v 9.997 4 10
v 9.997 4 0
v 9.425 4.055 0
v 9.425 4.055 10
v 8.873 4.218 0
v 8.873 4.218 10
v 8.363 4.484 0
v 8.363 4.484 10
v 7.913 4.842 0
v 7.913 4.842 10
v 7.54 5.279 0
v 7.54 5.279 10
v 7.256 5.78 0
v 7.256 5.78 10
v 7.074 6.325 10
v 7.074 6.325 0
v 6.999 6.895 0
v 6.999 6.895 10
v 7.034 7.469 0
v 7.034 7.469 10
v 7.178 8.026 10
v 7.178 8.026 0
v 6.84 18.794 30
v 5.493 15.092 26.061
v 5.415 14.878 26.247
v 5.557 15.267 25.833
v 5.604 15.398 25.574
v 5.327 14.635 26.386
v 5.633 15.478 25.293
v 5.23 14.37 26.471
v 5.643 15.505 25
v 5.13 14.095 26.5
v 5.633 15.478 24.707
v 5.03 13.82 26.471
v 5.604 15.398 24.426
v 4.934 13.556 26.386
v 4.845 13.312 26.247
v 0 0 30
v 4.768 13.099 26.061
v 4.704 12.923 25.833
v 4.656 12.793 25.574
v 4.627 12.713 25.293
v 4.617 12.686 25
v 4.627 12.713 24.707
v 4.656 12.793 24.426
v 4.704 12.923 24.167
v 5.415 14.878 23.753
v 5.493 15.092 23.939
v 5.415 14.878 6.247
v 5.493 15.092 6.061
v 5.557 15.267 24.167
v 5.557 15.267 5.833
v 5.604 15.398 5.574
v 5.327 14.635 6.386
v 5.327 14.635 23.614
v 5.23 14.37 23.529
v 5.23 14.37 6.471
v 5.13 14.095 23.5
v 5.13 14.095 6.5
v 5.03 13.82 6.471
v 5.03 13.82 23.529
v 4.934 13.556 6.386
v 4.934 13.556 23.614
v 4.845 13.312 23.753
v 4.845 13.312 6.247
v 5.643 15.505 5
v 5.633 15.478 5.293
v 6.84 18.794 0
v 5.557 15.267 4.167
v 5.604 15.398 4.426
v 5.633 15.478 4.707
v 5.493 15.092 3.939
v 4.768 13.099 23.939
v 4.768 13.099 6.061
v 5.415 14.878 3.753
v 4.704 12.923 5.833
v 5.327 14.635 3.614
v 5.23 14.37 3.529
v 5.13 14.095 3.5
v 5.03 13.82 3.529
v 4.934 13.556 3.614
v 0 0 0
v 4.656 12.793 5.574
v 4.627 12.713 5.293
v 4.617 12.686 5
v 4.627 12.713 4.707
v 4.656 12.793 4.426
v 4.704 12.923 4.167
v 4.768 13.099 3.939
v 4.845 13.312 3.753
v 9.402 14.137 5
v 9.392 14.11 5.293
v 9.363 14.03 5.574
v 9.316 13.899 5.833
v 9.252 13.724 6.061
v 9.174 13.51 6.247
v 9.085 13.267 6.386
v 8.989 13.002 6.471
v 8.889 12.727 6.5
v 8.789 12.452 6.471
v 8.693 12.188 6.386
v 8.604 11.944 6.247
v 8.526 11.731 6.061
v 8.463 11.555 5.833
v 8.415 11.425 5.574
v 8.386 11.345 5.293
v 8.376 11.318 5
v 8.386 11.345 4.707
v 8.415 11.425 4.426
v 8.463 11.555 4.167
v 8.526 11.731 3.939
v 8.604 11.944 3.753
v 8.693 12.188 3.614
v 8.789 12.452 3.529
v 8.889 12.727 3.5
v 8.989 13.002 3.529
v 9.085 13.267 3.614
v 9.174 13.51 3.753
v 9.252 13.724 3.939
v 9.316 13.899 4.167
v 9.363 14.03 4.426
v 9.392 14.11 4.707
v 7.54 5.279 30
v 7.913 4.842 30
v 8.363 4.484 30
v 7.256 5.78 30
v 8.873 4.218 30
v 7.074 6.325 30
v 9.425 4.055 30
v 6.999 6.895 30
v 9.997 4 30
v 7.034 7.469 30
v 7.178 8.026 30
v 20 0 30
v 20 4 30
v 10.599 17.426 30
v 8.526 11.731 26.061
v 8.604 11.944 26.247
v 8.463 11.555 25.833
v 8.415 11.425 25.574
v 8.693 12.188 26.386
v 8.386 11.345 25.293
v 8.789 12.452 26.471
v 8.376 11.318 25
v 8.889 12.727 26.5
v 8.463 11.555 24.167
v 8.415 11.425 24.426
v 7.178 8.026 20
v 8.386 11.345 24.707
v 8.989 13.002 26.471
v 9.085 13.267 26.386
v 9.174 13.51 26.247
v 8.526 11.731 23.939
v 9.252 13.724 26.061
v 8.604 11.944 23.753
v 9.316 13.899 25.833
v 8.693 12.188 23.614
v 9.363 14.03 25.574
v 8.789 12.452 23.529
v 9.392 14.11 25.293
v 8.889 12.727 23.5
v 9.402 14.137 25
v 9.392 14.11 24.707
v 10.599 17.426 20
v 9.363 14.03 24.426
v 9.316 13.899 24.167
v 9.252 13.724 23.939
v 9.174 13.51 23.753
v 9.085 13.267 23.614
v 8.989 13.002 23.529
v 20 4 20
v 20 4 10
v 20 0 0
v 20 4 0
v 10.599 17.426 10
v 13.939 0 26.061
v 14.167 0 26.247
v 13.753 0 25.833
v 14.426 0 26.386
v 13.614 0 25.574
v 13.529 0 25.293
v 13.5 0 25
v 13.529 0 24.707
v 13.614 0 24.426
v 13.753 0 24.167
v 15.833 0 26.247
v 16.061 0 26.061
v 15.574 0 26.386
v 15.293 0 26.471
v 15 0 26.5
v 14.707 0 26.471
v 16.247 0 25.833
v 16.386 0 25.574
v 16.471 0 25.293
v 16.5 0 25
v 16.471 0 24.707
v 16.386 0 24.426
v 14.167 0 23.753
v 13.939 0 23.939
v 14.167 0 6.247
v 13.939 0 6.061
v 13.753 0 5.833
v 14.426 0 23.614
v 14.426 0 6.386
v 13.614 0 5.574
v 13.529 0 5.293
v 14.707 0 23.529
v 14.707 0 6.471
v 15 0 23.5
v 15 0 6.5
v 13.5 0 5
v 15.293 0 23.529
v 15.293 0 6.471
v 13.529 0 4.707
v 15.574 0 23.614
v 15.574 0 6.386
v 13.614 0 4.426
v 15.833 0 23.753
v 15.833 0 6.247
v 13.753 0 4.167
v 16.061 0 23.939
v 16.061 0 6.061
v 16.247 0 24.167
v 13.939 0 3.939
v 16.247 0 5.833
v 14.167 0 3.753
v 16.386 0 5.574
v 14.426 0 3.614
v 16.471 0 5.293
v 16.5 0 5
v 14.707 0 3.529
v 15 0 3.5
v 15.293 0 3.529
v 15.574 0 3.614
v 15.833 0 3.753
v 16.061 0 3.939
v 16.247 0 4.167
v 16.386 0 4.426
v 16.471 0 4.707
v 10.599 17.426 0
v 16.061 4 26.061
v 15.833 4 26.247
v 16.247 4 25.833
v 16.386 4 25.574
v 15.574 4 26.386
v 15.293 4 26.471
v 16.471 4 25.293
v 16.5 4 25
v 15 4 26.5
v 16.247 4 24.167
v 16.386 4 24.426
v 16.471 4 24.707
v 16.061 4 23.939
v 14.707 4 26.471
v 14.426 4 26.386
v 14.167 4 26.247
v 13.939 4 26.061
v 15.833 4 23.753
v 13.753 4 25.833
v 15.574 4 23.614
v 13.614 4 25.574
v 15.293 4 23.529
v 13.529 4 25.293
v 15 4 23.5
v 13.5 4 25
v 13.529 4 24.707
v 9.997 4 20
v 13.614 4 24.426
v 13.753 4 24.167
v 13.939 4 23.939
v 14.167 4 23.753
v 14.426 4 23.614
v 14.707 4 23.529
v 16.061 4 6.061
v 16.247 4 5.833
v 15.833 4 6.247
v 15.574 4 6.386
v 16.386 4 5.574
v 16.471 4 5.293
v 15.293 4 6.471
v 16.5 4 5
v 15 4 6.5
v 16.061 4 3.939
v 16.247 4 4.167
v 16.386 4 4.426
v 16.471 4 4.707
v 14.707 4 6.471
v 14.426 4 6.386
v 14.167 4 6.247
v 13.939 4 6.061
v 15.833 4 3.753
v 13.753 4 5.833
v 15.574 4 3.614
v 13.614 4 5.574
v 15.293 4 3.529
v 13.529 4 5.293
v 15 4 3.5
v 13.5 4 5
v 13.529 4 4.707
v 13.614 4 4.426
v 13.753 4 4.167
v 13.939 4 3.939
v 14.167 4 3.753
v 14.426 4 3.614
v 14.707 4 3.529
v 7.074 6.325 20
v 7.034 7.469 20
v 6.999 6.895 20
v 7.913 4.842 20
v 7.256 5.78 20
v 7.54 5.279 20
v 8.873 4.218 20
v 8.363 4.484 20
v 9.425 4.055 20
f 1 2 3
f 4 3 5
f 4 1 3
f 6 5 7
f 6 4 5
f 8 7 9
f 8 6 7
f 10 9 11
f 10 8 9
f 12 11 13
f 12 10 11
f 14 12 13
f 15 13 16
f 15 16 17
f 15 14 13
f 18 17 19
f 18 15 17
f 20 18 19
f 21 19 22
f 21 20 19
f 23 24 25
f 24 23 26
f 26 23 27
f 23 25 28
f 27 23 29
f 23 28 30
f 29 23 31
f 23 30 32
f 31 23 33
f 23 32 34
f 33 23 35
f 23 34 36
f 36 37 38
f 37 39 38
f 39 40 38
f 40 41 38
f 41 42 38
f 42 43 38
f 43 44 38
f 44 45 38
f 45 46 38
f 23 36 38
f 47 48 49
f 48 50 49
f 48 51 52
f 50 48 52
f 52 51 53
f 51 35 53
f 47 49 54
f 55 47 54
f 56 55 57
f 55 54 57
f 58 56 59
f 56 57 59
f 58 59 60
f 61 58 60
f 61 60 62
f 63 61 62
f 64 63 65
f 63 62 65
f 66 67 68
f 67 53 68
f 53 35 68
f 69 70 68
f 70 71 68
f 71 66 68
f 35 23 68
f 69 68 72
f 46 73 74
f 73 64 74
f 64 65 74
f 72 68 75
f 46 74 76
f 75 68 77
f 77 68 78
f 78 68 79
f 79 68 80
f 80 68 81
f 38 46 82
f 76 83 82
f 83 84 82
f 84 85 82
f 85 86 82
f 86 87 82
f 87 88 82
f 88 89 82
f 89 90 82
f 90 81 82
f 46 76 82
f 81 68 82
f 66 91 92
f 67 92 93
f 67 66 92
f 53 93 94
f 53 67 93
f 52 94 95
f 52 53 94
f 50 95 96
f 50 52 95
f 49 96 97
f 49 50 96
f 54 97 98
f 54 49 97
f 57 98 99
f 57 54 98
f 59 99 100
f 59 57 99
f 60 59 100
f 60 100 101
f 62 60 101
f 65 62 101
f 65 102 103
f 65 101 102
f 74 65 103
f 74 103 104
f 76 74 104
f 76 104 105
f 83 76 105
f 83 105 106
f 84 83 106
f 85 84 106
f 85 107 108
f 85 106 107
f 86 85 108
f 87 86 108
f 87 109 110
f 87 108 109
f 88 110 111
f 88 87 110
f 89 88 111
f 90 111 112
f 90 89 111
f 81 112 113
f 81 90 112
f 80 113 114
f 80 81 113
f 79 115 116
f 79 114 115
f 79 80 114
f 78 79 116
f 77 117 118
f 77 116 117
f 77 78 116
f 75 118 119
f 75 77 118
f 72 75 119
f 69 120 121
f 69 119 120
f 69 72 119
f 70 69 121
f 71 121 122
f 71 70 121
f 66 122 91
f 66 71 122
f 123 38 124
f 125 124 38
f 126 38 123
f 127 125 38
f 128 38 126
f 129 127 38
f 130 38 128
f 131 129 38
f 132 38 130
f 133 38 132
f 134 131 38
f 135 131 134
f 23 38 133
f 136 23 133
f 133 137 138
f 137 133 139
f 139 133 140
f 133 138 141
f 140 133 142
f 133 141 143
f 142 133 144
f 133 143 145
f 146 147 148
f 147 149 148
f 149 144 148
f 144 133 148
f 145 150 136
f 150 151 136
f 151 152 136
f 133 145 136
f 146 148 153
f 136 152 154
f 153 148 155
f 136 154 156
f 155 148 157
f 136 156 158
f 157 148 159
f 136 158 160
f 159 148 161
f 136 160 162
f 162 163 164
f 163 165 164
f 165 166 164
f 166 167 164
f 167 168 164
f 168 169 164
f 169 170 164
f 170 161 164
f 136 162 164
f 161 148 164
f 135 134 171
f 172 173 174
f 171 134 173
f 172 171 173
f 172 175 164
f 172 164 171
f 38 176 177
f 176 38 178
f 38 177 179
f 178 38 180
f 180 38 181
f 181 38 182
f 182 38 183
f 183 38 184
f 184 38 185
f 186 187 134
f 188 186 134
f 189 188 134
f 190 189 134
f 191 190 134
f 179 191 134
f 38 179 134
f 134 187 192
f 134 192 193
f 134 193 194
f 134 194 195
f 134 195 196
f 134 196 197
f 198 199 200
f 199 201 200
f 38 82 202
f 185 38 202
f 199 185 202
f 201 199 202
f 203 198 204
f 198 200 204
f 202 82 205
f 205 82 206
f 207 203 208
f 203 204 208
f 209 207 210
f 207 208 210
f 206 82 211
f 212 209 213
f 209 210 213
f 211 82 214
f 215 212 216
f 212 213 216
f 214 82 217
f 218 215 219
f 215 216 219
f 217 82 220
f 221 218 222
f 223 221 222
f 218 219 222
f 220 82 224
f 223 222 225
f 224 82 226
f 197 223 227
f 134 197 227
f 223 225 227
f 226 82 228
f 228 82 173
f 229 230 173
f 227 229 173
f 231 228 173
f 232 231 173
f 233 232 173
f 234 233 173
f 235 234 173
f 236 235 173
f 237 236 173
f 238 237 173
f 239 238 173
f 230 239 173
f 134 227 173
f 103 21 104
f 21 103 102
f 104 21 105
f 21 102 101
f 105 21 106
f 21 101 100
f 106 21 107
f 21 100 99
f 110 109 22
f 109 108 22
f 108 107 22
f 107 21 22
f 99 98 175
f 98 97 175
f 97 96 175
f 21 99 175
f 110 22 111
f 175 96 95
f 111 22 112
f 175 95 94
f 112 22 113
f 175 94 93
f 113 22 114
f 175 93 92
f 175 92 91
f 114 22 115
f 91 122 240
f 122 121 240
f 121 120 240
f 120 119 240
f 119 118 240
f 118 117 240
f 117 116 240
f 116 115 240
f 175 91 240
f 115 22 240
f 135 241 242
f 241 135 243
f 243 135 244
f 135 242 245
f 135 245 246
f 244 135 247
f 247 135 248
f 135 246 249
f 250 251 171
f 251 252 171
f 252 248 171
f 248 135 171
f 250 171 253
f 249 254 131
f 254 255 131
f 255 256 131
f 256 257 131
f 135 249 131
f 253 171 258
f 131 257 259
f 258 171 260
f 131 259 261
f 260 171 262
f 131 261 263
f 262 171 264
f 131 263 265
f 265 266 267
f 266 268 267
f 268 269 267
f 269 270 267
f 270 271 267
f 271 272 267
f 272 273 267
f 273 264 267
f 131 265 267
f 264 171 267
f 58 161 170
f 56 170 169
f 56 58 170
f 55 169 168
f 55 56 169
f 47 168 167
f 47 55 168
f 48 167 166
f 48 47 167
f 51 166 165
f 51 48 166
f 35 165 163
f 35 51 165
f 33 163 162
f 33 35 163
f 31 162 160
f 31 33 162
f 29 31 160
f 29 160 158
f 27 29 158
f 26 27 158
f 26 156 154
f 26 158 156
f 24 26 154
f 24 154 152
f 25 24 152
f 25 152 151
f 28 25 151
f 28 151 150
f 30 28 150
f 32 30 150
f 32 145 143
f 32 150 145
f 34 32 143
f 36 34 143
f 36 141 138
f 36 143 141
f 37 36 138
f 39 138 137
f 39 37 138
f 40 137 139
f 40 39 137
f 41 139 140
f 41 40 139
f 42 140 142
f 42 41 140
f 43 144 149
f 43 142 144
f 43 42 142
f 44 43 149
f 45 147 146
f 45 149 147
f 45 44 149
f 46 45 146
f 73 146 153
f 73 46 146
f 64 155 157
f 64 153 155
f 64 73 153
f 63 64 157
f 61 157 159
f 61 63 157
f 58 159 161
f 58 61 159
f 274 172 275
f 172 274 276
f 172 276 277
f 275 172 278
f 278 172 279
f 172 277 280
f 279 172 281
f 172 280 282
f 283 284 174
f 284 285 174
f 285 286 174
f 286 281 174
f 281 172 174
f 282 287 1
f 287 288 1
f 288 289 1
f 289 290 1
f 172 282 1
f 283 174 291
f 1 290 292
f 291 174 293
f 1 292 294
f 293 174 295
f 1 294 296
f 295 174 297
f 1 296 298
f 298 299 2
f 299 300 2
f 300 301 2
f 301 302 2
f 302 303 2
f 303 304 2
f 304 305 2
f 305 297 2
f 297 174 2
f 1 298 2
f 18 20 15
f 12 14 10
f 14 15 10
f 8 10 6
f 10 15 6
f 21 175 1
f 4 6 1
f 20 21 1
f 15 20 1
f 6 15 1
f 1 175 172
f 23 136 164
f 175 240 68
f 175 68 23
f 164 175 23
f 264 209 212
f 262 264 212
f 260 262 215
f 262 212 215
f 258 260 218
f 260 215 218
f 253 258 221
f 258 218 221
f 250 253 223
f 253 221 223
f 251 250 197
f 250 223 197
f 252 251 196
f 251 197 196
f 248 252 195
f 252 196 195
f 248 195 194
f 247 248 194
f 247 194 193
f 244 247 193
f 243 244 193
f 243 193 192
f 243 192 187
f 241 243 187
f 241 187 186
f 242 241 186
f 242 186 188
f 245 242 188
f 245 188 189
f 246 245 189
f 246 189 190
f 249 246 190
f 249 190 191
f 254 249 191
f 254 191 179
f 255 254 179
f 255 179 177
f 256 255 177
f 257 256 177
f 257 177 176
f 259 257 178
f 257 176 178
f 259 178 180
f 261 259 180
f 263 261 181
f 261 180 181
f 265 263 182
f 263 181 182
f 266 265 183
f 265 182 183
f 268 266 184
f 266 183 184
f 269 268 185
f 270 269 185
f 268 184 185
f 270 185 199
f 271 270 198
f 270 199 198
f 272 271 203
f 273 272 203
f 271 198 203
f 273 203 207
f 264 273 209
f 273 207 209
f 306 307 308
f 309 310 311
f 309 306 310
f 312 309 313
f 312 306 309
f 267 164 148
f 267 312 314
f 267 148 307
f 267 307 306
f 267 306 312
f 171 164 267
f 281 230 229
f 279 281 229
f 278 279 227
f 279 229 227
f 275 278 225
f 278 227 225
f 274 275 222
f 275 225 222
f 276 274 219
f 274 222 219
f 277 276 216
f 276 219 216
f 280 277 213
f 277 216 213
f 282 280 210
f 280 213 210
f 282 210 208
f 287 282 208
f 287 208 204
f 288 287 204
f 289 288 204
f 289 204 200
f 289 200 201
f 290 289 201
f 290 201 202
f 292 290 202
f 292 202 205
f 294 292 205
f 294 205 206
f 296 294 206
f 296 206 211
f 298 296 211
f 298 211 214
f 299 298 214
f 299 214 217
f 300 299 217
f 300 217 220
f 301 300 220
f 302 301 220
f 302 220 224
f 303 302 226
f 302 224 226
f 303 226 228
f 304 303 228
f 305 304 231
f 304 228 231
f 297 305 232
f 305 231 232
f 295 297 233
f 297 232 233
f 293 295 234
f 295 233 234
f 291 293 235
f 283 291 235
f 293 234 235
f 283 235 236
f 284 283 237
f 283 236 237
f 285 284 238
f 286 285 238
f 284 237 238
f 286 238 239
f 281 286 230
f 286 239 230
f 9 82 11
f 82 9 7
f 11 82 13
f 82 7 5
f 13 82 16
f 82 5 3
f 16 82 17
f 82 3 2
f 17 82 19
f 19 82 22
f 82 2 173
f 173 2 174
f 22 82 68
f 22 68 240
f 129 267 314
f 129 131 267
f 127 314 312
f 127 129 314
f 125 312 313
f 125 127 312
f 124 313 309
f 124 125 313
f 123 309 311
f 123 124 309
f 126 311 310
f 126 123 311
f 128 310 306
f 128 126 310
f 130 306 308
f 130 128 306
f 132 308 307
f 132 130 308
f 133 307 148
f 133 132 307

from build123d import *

# Parameters (mm, degrees)
EXTRUDE_1_DEPTH     = 30
SKETCH_2_R          = 1.5
CUT_EXTRUDE_1_DEPTH = 5
RIB_11_REACH        = 33.276
SKETCH_3_WALL_W     = 80.94250335
SKETCH_3_WALL_H     = 10
FILLET_1_R          = 3


with BuildPart() as part:
    # 草图1 → 凸台-拉伸1 (new body)
    with BuildSketch(Plane.XY):
        Polygon((0, 0), (20, 0), (20, 4), (5.712592027, 4), (10.59917335, 17.425771842), (6.840402867, 18.793852416), align=None)
    extrude(amount=EXTRUDE_1_DEPTH)

    # 草图2 → 切除-拉伸1 (cut)
    with BuildSketch(Plane.XZ):
        with Locations(Location((15, 25, 0), (0, 0, 270))):
            Circle(SKETCH_2_R)
        with Locations((15, 5)):
            Circle(SKETCH_2_R)
    cut_extrude_1 = extrude(amount=-CUT_EXTRUDE_1_DEPTH, mode=Mode.SUBTRACT)

    # 镜向1: 切除-拉伸1 across plane
    add(cut_extrude_1.mirror(Plane(origin=(0, 0, 0), x_dir=(0, 0, 1), z_dir=(-0.5735764363510445, 0.8191520442889929, 0))), mode=Mode.SUBTRACT)

    # 草图3 wall → 筋11 (add, up to next)
    with BuildSketch(Plane(origin=(15.299586675, 10.712885921, 15), x_dir=(0.573576436349, -0.81915204429, 0), z_dir=(0.81915204429, 0.573576436349, 0)), mode=Mode.PRIVATE) as rib_11_sk1:
        Rectangle(SKETCH_3_WALL_W, SKETCH_3_WALL_H)
    rib_11_tool1 = extrude(rib_11_sk1.sketch, amount=-RIB_11_REACH, mode=Mode.PRIVATE) - part.part
    add(rib_11_tool1.solids().sort_by_distance((15.299586675, 10.712885921, 15))[0])

    # 圆角1
    fillet_1_edges = [part.edges().sort_by_distance(p)[0] for p in [
        (5.712592027, 4, 25),
        (5.712592027, 4, 5),
    ]]
    fillet(fillet_1_edges, radius=FILLET_1_R)


solid = part.part
